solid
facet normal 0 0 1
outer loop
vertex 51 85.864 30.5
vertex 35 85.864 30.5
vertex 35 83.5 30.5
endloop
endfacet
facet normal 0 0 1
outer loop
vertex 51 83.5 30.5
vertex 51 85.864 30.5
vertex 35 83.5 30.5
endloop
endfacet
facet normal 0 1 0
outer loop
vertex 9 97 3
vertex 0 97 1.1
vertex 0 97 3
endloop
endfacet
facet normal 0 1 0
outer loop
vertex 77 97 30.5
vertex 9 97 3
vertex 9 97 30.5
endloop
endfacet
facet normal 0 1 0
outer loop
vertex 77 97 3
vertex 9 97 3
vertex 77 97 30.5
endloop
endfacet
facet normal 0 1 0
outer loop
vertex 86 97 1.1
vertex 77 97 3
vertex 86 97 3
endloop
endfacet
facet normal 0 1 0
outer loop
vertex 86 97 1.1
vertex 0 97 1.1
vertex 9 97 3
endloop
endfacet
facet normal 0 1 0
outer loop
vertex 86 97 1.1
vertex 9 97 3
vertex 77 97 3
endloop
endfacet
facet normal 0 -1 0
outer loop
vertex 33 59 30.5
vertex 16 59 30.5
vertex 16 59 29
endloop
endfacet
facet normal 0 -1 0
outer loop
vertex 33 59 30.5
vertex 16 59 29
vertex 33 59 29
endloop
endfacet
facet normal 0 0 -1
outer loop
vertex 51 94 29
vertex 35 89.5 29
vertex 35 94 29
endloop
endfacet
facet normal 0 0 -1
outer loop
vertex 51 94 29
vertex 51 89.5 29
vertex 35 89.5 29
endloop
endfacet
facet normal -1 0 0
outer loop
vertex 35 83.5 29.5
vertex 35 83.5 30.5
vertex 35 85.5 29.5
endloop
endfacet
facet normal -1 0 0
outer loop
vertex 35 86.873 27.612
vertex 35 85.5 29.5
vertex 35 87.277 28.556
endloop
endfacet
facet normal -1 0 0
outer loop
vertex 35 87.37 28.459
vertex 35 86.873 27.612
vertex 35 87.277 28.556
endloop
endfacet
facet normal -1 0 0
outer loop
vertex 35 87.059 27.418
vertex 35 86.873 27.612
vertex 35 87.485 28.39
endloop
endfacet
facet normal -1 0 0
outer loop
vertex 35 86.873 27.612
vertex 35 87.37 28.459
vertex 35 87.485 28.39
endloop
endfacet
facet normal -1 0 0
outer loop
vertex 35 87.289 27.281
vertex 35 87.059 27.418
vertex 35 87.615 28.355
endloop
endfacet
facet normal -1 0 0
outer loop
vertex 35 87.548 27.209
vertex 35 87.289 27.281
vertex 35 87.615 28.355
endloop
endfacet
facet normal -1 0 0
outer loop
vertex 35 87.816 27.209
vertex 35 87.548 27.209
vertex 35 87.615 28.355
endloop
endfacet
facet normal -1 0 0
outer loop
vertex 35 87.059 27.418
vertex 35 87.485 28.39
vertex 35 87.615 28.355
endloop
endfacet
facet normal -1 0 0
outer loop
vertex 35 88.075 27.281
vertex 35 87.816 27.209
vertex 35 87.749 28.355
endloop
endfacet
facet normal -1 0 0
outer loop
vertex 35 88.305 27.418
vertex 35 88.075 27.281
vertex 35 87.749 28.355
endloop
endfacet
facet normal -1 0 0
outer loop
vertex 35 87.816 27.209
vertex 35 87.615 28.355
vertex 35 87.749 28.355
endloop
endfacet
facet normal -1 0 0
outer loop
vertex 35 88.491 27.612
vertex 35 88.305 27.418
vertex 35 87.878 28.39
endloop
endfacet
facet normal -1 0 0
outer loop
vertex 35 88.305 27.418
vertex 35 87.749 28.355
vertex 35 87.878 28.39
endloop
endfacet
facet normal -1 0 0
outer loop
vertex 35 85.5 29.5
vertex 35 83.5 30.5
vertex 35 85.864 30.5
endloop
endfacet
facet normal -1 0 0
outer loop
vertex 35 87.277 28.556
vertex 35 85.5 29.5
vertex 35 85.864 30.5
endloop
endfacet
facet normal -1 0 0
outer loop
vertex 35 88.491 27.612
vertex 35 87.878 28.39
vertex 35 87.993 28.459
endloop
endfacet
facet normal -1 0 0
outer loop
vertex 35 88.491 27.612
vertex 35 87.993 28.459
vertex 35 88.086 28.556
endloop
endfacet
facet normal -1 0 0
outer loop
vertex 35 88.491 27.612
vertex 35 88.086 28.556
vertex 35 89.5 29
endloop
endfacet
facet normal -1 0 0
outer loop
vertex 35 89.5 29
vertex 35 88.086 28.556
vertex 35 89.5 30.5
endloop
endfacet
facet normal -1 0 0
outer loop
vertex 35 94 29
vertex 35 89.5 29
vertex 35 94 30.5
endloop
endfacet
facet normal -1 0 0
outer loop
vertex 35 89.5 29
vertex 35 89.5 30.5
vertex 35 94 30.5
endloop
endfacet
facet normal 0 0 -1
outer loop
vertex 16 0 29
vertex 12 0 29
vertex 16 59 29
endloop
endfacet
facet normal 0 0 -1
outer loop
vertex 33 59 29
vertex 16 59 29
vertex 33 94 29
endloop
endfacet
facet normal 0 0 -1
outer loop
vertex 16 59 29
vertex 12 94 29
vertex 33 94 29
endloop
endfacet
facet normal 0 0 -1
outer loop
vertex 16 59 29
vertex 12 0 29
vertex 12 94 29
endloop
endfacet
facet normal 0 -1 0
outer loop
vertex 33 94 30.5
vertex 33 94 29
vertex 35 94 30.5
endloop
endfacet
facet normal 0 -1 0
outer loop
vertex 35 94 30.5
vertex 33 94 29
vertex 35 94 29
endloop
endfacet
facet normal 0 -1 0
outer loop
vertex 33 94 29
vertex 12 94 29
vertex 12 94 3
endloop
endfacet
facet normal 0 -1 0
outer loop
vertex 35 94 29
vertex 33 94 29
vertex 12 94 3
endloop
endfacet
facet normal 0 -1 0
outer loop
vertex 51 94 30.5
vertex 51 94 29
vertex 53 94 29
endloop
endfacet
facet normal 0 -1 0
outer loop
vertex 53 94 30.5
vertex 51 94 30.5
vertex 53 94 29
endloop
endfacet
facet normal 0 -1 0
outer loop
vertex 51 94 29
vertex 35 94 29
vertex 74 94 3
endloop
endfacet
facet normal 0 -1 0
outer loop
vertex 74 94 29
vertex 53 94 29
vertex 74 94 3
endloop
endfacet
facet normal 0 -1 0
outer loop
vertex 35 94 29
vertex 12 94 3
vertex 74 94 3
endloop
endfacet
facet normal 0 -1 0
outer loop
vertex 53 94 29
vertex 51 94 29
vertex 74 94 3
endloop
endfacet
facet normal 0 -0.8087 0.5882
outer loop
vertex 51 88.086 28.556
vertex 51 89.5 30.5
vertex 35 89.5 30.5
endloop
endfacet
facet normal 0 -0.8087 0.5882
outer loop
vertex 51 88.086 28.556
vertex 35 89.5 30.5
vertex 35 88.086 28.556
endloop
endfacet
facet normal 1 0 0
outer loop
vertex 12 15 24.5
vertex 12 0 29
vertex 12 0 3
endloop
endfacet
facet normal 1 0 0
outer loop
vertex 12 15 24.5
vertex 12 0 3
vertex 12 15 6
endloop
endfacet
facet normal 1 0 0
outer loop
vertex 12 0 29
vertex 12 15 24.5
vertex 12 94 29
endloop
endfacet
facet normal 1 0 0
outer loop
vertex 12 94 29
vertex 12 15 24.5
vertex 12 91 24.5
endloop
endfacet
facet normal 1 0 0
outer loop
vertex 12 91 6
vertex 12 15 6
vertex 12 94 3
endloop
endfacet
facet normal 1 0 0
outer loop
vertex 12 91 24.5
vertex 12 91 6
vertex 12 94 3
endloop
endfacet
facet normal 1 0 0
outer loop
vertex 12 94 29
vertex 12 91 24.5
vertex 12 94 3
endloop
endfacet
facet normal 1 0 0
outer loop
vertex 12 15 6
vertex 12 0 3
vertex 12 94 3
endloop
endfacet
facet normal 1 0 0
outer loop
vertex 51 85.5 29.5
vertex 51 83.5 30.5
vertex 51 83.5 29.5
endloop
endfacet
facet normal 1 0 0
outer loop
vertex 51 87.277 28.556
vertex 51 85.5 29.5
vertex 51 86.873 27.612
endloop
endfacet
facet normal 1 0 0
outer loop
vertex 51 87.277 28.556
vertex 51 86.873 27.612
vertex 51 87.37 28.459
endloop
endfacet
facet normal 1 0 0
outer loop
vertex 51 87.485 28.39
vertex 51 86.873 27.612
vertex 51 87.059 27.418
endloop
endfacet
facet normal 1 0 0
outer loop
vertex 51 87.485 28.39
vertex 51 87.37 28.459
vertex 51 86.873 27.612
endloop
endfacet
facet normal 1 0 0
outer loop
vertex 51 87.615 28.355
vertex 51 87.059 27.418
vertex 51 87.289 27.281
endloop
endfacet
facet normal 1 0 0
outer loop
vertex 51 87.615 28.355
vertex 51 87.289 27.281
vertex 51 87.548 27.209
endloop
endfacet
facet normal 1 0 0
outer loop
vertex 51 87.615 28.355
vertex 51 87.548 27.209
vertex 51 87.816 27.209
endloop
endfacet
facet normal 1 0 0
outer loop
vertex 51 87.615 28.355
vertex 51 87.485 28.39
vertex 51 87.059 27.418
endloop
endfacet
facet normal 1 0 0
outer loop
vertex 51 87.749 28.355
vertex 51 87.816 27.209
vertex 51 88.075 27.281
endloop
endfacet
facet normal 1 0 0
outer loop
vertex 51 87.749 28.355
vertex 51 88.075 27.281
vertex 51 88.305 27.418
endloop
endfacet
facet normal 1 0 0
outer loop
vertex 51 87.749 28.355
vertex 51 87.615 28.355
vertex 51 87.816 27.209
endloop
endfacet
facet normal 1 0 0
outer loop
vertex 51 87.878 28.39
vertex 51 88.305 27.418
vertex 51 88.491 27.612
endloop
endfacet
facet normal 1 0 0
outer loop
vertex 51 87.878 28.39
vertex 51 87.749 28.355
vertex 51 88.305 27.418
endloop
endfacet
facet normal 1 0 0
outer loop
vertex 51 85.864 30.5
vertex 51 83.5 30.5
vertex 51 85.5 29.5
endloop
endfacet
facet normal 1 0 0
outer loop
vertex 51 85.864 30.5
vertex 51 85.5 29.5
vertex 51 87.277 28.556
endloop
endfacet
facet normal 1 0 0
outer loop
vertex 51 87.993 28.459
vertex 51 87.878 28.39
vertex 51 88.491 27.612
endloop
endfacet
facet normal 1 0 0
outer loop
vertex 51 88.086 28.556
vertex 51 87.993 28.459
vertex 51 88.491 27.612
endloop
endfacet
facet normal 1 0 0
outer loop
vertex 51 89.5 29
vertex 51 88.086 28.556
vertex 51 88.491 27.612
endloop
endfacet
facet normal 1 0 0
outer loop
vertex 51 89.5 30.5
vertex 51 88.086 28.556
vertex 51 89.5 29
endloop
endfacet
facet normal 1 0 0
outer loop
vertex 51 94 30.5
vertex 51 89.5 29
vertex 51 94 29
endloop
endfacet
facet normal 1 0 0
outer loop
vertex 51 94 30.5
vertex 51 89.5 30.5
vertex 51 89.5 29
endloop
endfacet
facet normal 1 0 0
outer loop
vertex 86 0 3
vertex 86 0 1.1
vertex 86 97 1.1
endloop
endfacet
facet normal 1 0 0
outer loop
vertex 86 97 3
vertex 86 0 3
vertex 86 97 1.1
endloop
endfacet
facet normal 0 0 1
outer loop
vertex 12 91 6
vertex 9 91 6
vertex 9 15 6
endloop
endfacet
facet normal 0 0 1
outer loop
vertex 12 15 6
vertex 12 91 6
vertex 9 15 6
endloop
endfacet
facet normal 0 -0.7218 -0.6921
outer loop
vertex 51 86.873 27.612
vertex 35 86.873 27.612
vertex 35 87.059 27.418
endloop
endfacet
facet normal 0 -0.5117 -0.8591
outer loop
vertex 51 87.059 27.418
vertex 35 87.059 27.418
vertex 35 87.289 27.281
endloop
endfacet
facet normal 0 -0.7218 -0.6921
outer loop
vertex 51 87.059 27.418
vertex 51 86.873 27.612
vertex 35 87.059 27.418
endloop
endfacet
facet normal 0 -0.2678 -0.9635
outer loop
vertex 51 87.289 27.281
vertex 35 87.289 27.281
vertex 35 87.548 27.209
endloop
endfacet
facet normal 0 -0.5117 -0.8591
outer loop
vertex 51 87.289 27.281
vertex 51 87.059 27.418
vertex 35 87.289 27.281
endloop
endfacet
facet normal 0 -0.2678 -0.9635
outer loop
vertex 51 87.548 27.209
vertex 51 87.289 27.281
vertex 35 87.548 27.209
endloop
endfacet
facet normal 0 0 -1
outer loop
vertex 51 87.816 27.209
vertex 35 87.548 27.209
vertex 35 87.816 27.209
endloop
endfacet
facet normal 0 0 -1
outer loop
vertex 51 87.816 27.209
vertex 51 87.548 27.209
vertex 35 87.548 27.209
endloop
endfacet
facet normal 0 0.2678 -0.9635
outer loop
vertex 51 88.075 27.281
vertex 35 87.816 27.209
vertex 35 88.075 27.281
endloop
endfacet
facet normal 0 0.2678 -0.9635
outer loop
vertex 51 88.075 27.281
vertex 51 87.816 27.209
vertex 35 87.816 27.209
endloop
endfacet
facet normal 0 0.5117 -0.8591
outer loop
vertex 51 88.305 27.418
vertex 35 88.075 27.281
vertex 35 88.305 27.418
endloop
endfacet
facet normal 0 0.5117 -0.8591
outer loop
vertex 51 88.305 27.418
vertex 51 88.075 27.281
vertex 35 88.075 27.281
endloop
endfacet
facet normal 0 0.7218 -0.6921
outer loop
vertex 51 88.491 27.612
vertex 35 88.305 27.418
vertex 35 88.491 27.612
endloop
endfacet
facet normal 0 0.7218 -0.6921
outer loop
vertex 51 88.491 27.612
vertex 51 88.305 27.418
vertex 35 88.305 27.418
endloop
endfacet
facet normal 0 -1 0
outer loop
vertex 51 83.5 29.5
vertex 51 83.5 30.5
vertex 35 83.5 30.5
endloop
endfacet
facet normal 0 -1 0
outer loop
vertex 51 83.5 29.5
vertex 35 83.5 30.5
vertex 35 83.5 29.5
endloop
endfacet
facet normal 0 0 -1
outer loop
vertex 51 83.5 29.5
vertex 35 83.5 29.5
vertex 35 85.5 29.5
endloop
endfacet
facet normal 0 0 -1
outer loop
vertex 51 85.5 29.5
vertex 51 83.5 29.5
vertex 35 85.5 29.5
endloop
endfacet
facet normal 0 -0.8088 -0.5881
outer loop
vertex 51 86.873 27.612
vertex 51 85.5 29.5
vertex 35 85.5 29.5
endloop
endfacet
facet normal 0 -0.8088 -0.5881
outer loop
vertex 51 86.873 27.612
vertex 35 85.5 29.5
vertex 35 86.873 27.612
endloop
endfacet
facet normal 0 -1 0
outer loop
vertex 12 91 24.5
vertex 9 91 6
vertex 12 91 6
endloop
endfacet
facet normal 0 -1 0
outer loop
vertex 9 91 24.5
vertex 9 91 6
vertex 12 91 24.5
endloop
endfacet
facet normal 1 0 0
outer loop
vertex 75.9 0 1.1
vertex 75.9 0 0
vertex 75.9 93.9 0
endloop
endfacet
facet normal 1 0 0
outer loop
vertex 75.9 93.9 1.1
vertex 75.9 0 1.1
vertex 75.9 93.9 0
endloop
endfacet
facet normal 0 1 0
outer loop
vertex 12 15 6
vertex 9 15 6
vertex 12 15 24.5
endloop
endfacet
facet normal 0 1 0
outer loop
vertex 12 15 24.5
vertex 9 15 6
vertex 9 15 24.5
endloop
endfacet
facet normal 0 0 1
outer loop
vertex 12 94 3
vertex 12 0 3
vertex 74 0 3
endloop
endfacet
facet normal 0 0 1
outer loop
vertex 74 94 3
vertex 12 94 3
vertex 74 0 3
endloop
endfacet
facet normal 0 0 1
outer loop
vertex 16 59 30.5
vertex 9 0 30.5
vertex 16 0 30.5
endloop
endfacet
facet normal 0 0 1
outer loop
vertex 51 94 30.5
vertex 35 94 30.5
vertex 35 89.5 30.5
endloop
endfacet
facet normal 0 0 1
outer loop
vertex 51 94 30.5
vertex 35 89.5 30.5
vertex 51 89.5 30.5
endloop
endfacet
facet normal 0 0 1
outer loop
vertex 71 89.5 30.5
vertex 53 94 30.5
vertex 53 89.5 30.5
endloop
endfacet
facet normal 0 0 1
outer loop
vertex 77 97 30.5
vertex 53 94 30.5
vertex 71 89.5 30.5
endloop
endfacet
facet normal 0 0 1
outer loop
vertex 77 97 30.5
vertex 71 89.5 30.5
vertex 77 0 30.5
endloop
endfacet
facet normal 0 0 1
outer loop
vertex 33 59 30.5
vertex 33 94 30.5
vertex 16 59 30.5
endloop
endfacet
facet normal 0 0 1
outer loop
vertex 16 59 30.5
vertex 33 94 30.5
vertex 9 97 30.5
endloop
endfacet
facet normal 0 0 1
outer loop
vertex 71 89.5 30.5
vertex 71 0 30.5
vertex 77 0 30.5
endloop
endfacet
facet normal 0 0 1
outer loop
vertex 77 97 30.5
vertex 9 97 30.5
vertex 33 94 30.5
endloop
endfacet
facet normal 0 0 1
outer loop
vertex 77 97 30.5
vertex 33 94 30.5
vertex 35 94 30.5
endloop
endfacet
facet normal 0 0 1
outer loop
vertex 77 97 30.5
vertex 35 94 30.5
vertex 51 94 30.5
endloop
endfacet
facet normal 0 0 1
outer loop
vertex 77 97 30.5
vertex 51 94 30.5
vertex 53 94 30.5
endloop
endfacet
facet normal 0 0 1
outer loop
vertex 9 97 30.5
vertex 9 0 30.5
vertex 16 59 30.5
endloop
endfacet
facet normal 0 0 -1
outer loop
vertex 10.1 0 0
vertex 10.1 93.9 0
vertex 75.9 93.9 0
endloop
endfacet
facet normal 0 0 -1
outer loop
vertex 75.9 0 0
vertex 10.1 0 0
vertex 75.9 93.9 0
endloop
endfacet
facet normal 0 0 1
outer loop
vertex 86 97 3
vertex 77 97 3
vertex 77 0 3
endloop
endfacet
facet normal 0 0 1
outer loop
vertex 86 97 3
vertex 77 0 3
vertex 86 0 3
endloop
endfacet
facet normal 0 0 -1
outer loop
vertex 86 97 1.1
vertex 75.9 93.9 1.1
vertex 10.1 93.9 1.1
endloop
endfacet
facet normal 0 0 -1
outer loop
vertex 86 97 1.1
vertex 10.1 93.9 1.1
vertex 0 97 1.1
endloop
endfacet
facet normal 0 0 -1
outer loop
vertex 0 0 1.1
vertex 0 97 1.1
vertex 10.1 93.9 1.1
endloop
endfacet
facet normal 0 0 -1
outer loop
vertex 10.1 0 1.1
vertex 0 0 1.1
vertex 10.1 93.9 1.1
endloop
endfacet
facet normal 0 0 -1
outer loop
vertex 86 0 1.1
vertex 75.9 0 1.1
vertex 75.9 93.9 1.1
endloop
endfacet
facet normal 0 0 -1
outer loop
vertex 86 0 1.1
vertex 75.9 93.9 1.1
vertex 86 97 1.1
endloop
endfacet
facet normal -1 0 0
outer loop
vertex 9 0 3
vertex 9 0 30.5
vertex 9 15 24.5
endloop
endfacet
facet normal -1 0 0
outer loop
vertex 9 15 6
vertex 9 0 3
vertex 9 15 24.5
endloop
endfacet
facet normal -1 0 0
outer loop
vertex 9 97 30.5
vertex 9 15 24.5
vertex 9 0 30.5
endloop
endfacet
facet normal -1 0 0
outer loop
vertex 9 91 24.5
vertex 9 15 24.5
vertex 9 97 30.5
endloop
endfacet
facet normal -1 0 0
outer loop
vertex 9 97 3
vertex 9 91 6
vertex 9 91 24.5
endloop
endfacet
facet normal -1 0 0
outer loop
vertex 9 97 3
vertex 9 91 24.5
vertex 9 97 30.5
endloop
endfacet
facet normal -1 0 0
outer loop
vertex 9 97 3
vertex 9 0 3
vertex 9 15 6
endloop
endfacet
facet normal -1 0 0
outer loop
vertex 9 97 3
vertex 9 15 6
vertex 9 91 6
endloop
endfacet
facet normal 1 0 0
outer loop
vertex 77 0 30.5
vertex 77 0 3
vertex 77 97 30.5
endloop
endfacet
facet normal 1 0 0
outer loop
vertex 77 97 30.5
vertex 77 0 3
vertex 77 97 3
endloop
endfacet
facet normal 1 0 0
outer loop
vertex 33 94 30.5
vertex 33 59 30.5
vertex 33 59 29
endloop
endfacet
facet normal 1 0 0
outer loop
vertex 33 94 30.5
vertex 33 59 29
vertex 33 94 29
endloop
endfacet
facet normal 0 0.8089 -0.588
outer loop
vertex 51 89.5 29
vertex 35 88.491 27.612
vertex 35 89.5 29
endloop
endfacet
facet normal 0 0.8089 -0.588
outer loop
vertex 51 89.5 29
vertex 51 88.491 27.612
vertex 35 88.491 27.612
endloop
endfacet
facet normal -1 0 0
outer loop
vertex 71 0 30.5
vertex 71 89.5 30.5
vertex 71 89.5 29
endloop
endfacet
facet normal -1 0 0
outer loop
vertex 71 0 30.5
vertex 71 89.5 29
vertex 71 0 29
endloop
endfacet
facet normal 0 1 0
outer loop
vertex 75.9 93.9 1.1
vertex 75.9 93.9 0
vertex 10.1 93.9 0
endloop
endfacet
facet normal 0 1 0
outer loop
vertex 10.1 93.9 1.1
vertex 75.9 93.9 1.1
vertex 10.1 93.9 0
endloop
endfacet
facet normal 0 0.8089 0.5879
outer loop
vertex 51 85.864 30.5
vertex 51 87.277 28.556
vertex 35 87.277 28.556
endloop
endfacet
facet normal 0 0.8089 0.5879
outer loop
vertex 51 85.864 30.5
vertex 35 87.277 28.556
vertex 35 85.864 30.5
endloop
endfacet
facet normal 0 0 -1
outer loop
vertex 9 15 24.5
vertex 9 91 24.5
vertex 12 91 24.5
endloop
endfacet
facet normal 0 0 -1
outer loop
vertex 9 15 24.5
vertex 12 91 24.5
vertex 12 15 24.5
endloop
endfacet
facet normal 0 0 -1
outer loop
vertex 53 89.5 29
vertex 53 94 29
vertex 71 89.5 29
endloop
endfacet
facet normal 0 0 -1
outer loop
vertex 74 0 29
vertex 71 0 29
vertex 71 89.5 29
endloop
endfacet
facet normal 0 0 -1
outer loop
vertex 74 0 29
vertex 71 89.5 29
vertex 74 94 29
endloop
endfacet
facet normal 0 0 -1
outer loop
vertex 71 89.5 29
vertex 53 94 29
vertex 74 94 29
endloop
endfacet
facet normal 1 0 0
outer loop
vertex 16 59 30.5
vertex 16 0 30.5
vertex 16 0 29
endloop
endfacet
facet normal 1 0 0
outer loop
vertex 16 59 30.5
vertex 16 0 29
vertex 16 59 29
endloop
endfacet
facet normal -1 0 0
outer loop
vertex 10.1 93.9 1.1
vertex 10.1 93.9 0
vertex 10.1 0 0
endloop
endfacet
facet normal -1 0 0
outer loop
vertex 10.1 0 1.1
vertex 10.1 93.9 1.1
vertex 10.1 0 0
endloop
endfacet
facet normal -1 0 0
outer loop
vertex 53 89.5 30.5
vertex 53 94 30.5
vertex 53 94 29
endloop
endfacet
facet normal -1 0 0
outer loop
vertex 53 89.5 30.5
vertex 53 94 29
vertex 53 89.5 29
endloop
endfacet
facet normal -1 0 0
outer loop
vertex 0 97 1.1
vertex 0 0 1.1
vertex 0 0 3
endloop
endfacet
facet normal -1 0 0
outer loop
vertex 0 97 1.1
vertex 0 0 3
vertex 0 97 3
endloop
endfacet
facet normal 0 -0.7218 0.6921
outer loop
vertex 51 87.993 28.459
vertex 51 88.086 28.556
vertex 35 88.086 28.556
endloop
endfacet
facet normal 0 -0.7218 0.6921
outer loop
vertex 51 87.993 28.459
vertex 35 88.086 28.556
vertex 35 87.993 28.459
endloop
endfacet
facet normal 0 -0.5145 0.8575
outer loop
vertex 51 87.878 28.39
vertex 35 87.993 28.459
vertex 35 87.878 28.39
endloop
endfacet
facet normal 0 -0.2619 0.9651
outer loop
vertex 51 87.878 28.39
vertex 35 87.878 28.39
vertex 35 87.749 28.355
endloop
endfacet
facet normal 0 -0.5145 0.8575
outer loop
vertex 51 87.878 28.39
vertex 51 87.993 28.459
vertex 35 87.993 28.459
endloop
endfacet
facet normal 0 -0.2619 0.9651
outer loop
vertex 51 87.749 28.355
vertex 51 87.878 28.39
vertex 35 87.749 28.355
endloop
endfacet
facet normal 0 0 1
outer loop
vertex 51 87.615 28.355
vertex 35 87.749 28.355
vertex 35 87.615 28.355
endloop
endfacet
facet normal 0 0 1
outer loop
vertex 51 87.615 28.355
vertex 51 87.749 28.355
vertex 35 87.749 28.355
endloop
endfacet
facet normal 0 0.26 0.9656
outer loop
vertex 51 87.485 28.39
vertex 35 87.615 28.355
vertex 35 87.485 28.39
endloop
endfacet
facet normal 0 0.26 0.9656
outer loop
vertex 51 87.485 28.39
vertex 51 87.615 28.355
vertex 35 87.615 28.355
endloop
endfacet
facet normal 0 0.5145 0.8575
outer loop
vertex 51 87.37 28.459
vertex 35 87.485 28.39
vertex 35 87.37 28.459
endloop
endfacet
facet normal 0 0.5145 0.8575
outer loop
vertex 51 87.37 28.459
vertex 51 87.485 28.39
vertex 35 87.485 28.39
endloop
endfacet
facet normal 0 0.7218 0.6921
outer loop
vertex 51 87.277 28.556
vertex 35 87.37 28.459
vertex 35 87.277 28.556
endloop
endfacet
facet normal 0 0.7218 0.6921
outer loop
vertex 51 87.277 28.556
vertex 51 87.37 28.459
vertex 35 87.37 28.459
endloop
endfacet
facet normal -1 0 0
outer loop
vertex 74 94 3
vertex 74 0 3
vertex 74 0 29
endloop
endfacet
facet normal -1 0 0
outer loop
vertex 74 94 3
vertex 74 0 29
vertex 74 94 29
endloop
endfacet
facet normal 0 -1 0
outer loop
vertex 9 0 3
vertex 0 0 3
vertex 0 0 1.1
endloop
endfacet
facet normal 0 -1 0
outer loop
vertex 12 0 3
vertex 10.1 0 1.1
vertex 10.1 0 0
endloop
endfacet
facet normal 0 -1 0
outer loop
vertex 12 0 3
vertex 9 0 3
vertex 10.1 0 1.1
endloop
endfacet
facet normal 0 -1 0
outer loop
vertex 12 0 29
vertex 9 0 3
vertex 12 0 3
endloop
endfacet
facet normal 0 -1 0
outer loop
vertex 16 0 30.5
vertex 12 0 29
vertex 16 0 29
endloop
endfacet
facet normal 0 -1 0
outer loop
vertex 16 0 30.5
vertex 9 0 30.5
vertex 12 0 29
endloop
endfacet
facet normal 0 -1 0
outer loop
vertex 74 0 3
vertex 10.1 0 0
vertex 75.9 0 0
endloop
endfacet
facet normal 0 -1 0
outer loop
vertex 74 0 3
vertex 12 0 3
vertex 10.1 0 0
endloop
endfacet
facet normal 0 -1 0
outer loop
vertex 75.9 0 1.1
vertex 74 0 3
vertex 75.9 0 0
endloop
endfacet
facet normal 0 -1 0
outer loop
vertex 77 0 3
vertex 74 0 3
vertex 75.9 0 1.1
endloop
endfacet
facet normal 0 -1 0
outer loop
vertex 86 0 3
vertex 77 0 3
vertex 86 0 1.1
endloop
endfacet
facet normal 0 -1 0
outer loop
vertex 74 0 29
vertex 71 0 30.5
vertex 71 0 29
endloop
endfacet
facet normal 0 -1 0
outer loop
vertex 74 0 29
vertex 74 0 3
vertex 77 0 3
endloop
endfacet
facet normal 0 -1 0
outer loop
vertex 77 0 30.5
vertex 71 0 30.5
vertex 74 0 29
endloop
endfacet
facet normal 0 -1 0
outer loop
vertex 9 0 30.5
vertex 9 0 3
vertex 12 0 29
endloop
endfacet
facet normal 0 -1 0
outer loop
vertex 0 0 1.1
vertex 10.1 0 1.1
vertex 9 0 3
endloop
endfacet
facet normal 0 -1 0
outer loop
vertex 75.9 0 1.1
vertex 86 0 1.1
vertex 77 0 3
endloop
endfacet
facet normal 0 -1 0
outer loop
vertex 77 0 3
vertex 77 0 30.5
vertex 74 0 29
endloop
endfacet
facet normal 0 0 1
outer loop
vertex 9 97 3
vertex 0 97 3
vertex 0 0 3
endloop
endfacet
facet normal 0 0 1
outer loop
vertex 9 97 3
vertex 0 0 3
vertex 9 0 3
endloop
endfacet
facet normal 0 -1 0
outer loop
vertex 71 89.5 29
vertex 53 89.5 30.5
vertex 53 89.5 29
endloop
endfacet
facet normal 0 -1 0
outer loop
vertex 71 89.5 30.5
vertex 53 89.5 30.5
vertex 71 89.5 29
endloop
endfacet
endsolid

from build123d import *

# Parameters (mm, degrees)
F0_W        = 86
F0_H        = 97
F1_DEPTH    = 3
F2_W        = 68
F2_H        = 97
F3_DEPTH    = 27.5
F4_T        = 3
F4_T3_DEPTH = 103
F7_DEPTH    = 8
F9_DEPTH    = 1.5
F10_W       = 76
F10_H       = 18.5
F11_DEPTH   = 3
F13_DEPTH   = 1.1


# Not quite as in the source:
# - a shell that OpenCascade refuses in one call is made with other operations: the cavity is built on its own and cut out


with BuildPart() as f1:
    # F0 (on Top) → F1 (new body)
    with BuildSketch(Plane.XY):
        with Locations((43, 48.5)):
            Rectangle(F0_W, F0_H)
    extrude(amount=F1_DEPTH)

    # F2 (on face) → F3 (join)
    with BuildSketch(Plane.XY.offset(3)):
        with Locations((43, 48.5)):
            Rectangle(F2_W, F2_H)
    extrude(amount=F3_DEPTH)

    # F4: shell of thickness 3, made by hand


with BuildPart() as f4_core1:
    # F4_t2: copy of F1
    add(f1.part)

    # the walls: a layer under each face that stays
    f4_faces = [f4_core1.faces().sort_by_distance(p)[0] for p in [
        (43, 97, 15.25),
        (86, 48.5, 1.5),
        (0, 48.5, 1.5),
        (43, 48.5, 0),
        (81.5, 48.5, 3),
        (4.5, 48.5, 3),
        (77, 48.5, 16.75),
        (9, 48.5, 16.75),
    ]]
    thicken(f4_faces, amount=-F4_T, mode=Mode.SUBTRACT)

    # F4_s4 → F4_t3 (cut)
    with BuildSketch(Plane.XZ.offset(-100)):
        Polygon((77.03, 3.03), (77, 0), (74, 0), (74, 3), align=None)
        Polygon((8.97, 3.03), (9, 0), (12, 0), (12, 3), align=None)
    extrude(amount=F4_T3_DEPTH, mode=Mode.SUBTRACT)


with BuildPart() as f1_1:
    add(f1.part)

    # what is left inside the walls is the cavity
    f4_cavity = [f4_core1.part.solids().sort_by_distance(p)[0] for p in [
        (43, 31.333333, 3.03),
    ]]
    add(f4_cavity, mode=Mode.SUBTRACT)

    # F6 (on mid) → F7 (join, symmetric)
    with BuildSketch(Plane.YZ.offset(43)):
        with BuildLine():
            Line((94, 29), (94, 30.5))
            Line((94, 30.5), (89.5, 30.5))
            Line((89.5, 30.5), (88.086186224, 28.556006058))
            ThreePointArc((88.086186224, 28.556006058), (87.6818181818, 28.3500919068), (87.2774501397, 28.556006058))
            Line((87.2774501397, 28.556006058), (85.8636363636, 30.5))
            Line((85.8636363636, 30.5), (83.5, 30.5))
            Line((83.5, 30.5), (83.5, 29.5))
            Line((83.5, 29.5), (85.5, 29.5))
            Line((85.5, 29.5), (86.8730820975, 27.6120121159))
            ThreePointArc((86.8730820975, 27.6120121159), (87.6818181818, 27.2001838136), (88.4905542661, 27.6120121159))
            Line((88.4905542661, 27.6120121159), (89.5, 29))
            Line((89.5, 29), (94, 29))
        make_face()
    extrude(amount=F7_DEPTH, both=True)

    # F8 (on face) → F9 (join)
    with BuildSketch(Plane.XY.offset(30.5)):
        Polygon((33, 59), (33, 94), (12, 94), (12, 59), (12, 0), (16, 0), (16, 59), align=None)
        Polygon((59, 94), (53, 94), (53, 89.5), (71, 89.5), (71, 0), (74, 0), (74, 89.5), (74, 94), (71, 94), align=None)
    extrude(amount=-F9_DEPTH)

    # F10 (on face) → F11 (cut, through all)
    with BuildSketch(Plane(origin=(9, 0, 0), x_dir=(0, -1, 0), z_dir=(-1, 0, 0))):
        with Locations((-53, 15.25)):
            Rectangle(F10_W, F10_H)
    extrude(amount=-F11_DEPTH, mode=Mode.SUBTRACT)

    # F12 (on face) → F13 (cut)
    with BuildSketch(Plane(origin=(0, 0, 0), x_dir=(1, 0, 0), z_dir=(0, 0, -1))):
        Polygon((0, 0), (0, -97), (10.1, -97), (75.9, -97), (86, -97), (86, 0), (75.9, 0), (75.9, -93.9), (10.1, -93.9), (10.1, 0), align=None)
    extrude(amount=-F13_DEPTH, mode=Mode.SUBTRACT)


solid = f1_1.part
